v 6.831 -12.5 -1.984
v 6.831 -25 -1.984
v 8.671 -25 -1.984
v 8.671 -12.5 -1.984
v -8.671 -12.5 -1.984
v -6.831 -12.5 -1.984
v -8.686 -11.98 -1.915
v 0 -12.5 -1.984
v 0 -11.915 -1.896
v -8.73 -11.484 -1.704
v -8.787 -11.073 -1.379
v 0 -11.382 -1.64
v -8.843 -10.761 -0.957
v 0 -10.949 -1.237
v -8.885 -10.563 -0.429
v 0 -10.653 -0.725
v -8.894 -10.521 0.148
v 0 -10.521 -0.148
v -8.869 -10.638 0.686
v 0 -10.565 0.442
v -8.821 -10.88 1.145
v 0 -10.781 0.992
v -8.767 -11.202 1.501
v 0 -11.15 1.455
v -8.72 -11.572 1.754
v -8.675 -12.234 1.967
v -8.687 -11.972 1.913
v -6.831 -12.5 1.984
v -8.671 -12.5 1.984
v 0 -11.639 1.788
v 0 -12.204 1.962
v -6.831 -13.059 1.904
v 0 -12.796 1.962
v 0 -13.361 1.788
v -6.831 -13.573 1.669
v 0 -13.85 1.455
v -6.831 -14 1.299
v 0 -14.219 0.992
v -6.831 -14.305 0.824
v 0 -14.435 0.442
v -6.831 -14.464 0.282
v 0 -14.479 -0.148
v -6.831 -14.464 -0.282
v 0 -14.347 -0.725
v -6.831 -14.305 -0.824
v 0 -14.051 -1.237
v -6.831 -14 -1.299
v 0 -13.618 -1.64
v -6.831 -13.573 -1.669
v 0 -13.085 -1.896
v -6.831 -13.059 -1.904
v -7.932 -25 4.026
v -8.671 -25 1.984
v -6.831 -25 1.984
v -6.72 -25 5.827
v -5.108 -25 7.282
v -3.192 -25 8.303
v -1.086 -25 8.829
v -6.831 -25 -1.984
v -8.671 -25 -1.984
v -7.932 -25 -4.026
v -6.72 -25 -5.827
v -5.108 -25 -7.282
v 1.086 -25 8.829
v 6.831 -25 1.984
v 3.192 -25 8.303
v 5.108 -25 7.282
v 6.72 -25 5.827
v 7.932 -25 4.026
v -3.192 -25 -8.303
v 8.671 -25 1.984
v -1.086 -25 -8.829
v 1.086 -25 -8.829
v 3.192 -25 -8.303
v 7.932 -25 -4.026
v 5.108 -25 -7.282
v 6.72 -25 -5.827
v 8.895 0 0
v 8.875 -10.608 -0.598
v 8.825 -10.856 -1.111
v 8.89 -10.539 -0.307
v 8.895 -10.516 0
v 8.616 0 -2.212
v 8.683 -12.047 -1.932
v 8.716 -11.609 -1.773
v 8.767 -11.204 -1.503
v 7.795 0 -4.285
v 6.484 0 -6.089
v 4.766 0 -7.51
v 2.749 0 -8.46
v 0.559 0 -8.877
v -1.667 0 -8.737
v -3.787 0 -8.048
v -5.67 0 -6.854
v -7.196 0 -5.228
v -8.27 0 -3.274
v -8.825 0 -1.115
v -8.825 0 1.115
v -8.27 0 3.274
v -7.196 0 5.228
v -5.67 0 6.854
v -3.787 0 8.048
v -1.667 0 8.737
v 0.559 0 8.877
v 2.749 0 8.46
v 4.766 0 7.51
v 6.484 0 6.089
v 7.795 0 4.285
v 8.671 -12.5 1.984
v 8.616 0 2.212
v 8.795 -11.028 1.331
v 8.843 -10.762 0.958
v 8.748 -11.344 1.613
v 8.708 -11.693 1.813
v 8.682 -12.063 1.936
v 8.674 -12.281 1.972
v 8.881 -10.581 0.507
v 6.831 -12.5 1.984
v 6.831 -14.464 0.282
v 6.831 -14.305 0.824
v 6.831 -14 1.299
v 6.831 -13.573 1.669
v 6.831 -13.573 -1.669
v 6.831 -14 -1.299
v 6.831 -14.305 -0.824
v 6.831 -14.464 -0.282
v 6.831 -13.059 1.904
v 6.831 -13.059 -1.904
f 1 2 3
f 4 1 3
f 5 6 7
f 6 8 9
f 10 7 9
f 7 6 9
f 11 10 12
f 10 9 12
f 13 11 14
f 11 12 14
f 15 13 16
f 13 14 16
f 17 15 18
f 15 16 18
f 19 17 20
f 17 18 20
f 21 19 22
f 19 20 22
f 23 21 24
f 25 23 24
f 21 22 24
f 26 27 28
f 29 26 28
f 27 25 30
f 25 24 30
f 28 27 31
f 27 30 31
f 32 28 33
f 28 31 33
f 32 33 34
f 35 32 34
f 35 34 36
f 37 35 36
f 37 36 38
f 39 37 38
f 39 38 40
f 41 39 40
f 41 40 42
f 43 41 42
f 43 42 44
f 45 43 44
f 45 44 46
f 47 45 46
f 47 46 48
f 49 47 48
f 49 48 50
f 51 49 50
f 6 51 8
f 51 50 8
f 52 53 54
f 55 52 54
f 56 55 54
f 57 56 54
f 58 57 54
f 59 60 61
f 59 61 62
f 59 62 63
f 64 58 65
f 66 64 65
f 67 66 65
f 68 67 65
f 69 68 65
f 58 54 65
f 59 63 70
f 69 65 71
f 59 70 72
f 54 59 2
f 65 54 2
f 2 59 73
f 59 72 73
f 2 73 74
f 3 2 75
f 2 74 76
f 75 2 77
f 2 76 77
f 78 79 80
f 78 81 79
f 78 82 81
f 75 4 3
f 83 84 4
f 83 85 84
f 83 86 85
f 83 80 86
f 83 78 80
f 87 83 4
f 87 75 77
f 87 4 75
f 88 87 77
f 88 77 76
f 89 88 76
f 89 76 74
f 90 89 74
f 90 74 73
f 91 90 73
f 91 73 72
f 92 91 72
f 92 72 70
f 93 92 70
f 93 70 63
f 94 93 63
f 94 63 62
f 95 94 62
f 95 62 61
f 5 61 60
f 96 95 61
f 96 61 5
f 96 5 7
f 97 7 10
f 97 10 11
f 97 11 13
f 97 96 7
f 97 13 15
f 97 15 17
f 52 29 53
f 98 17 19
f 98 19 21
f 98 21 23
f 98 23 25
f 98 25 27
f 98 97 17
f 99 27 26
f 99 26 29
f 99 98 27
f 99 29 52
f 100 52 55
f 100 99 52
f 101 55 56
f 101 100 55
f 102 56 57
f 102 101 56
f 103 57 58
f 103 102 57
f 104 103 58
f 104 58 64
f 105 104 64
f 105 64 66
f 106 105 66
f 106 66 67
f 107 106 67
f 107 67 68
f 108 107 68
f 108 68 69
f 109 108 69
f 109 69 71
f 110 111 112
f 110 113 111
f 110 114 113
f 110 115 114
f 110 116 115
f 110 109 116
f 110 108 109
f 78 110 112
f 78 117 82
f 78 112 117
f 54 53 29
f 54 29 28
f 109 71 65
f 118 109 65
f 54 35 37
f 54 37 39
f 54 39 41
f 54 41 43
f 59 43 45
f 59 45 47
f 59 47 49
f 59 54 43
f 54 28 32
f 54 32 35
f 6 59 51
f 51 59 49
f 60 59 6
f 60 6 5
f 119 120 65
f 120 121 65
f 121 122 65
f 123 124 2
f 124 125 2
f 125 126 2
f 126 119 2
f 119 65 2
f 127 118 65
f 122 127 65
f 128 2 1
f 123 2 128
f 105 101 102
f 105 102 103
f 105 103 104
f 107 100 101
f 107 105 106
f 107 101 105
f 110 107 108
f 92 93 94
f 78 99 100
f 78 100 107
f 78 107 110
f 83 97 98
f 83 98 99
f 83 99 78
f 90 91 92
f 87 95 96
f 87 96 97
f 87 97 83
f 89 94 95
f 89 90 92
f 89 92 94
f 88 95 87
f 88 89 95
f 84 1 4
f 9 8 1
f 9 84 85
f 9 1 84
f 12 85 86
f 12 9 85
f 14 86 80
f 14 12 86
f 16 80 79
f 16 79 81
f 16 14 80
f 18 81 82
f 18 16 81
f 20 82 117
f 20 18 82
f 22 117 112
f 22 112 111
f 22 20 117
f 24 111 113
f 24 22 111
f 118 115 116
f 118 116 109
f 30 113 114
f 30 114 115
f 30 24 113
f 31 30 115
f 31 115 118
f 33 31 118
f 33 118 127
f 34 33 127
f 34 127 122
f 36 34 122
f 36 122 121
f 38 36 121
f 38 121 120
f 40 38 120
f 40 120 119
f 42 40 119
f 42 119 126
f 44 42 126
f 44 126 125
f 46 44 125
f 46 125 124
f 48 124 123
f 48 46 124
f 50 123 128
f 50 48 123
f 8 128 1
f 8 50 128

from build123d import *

# Parameters (mm, degrees)
SKETCH1_R               = 8.895
BOSS_EXTRUDE1_DEPTH     = 25
CUT_EXTRUDE1_DEPTH      = 12.5
SKETCH3_R               = 1.984375
CUT_EXTRUDE2_DEPTH      = 9.895
CUT_EXTRUDE2_DEPTH_BACK = 9.895


with BuildPart() as part:
    # Sketch1 → Boss-Extrude1 (new body)
    with BuildSketch(Plane(origin=(0, 0, 0), x_dir=(1, 0, 0), z_dir=(0, 1, 0))):
        Circle(SKETCH1_R)
    extrude(amount=-BOSS_EXTRUDE1_DEPTH)

    # Sketch2 → Cut-Extrude1 (cut)
    with BuildSketch(Plane.XZ.offset(25)):
        with BuildLine():
            Line((-6.83125, 1.984375), (-6.83125, -1.984375))
            Line((-6.83125, -1.984375), (-8.670829306, -1.984375))
            ThreePointArc((-8.670829306, -1.984375), (-8.895, 0), (-8.670829306, 1.984375))
            Line((-8.670829306, 1.984375), (-6.83125, 1.984375))
        make_face()
    cut_extrude1 = extrude(amount=-CUT_EXTRUDE1_DEPTH, mode=Mode.SUBTRACT)

    # Mirror1: Cut-Extrude1 across plane
    add(cut_extrude1.mirror(Plane(origin=(0, 0, 0), x_dir=(0, 0, 1), z_dir=(1, 0, 0))), mode=Mode.SUBTRACT)

    # Sketch3 → Cut-Extrude2 (cut, two sides)
    with BuildSketch(Plane(origin=(0, 0, 0), x_dir=(0, 0, -1), z_dir=(1, 0, 0))) as cut_extrude2_sk:
        with Locations((0, -12.5)):
            Circle(SKETCH3_R)
    extrude(amount=CUT_EXTRUDE2_DEPTH, mode=Mode.SUBTRACT)
    extrude(cut_extrude2_sk.sketch, amount=-CUT_EXTRUDE2_DEPTH_BACK, mode=Mode.SUBTRACT)


solid = part.part
